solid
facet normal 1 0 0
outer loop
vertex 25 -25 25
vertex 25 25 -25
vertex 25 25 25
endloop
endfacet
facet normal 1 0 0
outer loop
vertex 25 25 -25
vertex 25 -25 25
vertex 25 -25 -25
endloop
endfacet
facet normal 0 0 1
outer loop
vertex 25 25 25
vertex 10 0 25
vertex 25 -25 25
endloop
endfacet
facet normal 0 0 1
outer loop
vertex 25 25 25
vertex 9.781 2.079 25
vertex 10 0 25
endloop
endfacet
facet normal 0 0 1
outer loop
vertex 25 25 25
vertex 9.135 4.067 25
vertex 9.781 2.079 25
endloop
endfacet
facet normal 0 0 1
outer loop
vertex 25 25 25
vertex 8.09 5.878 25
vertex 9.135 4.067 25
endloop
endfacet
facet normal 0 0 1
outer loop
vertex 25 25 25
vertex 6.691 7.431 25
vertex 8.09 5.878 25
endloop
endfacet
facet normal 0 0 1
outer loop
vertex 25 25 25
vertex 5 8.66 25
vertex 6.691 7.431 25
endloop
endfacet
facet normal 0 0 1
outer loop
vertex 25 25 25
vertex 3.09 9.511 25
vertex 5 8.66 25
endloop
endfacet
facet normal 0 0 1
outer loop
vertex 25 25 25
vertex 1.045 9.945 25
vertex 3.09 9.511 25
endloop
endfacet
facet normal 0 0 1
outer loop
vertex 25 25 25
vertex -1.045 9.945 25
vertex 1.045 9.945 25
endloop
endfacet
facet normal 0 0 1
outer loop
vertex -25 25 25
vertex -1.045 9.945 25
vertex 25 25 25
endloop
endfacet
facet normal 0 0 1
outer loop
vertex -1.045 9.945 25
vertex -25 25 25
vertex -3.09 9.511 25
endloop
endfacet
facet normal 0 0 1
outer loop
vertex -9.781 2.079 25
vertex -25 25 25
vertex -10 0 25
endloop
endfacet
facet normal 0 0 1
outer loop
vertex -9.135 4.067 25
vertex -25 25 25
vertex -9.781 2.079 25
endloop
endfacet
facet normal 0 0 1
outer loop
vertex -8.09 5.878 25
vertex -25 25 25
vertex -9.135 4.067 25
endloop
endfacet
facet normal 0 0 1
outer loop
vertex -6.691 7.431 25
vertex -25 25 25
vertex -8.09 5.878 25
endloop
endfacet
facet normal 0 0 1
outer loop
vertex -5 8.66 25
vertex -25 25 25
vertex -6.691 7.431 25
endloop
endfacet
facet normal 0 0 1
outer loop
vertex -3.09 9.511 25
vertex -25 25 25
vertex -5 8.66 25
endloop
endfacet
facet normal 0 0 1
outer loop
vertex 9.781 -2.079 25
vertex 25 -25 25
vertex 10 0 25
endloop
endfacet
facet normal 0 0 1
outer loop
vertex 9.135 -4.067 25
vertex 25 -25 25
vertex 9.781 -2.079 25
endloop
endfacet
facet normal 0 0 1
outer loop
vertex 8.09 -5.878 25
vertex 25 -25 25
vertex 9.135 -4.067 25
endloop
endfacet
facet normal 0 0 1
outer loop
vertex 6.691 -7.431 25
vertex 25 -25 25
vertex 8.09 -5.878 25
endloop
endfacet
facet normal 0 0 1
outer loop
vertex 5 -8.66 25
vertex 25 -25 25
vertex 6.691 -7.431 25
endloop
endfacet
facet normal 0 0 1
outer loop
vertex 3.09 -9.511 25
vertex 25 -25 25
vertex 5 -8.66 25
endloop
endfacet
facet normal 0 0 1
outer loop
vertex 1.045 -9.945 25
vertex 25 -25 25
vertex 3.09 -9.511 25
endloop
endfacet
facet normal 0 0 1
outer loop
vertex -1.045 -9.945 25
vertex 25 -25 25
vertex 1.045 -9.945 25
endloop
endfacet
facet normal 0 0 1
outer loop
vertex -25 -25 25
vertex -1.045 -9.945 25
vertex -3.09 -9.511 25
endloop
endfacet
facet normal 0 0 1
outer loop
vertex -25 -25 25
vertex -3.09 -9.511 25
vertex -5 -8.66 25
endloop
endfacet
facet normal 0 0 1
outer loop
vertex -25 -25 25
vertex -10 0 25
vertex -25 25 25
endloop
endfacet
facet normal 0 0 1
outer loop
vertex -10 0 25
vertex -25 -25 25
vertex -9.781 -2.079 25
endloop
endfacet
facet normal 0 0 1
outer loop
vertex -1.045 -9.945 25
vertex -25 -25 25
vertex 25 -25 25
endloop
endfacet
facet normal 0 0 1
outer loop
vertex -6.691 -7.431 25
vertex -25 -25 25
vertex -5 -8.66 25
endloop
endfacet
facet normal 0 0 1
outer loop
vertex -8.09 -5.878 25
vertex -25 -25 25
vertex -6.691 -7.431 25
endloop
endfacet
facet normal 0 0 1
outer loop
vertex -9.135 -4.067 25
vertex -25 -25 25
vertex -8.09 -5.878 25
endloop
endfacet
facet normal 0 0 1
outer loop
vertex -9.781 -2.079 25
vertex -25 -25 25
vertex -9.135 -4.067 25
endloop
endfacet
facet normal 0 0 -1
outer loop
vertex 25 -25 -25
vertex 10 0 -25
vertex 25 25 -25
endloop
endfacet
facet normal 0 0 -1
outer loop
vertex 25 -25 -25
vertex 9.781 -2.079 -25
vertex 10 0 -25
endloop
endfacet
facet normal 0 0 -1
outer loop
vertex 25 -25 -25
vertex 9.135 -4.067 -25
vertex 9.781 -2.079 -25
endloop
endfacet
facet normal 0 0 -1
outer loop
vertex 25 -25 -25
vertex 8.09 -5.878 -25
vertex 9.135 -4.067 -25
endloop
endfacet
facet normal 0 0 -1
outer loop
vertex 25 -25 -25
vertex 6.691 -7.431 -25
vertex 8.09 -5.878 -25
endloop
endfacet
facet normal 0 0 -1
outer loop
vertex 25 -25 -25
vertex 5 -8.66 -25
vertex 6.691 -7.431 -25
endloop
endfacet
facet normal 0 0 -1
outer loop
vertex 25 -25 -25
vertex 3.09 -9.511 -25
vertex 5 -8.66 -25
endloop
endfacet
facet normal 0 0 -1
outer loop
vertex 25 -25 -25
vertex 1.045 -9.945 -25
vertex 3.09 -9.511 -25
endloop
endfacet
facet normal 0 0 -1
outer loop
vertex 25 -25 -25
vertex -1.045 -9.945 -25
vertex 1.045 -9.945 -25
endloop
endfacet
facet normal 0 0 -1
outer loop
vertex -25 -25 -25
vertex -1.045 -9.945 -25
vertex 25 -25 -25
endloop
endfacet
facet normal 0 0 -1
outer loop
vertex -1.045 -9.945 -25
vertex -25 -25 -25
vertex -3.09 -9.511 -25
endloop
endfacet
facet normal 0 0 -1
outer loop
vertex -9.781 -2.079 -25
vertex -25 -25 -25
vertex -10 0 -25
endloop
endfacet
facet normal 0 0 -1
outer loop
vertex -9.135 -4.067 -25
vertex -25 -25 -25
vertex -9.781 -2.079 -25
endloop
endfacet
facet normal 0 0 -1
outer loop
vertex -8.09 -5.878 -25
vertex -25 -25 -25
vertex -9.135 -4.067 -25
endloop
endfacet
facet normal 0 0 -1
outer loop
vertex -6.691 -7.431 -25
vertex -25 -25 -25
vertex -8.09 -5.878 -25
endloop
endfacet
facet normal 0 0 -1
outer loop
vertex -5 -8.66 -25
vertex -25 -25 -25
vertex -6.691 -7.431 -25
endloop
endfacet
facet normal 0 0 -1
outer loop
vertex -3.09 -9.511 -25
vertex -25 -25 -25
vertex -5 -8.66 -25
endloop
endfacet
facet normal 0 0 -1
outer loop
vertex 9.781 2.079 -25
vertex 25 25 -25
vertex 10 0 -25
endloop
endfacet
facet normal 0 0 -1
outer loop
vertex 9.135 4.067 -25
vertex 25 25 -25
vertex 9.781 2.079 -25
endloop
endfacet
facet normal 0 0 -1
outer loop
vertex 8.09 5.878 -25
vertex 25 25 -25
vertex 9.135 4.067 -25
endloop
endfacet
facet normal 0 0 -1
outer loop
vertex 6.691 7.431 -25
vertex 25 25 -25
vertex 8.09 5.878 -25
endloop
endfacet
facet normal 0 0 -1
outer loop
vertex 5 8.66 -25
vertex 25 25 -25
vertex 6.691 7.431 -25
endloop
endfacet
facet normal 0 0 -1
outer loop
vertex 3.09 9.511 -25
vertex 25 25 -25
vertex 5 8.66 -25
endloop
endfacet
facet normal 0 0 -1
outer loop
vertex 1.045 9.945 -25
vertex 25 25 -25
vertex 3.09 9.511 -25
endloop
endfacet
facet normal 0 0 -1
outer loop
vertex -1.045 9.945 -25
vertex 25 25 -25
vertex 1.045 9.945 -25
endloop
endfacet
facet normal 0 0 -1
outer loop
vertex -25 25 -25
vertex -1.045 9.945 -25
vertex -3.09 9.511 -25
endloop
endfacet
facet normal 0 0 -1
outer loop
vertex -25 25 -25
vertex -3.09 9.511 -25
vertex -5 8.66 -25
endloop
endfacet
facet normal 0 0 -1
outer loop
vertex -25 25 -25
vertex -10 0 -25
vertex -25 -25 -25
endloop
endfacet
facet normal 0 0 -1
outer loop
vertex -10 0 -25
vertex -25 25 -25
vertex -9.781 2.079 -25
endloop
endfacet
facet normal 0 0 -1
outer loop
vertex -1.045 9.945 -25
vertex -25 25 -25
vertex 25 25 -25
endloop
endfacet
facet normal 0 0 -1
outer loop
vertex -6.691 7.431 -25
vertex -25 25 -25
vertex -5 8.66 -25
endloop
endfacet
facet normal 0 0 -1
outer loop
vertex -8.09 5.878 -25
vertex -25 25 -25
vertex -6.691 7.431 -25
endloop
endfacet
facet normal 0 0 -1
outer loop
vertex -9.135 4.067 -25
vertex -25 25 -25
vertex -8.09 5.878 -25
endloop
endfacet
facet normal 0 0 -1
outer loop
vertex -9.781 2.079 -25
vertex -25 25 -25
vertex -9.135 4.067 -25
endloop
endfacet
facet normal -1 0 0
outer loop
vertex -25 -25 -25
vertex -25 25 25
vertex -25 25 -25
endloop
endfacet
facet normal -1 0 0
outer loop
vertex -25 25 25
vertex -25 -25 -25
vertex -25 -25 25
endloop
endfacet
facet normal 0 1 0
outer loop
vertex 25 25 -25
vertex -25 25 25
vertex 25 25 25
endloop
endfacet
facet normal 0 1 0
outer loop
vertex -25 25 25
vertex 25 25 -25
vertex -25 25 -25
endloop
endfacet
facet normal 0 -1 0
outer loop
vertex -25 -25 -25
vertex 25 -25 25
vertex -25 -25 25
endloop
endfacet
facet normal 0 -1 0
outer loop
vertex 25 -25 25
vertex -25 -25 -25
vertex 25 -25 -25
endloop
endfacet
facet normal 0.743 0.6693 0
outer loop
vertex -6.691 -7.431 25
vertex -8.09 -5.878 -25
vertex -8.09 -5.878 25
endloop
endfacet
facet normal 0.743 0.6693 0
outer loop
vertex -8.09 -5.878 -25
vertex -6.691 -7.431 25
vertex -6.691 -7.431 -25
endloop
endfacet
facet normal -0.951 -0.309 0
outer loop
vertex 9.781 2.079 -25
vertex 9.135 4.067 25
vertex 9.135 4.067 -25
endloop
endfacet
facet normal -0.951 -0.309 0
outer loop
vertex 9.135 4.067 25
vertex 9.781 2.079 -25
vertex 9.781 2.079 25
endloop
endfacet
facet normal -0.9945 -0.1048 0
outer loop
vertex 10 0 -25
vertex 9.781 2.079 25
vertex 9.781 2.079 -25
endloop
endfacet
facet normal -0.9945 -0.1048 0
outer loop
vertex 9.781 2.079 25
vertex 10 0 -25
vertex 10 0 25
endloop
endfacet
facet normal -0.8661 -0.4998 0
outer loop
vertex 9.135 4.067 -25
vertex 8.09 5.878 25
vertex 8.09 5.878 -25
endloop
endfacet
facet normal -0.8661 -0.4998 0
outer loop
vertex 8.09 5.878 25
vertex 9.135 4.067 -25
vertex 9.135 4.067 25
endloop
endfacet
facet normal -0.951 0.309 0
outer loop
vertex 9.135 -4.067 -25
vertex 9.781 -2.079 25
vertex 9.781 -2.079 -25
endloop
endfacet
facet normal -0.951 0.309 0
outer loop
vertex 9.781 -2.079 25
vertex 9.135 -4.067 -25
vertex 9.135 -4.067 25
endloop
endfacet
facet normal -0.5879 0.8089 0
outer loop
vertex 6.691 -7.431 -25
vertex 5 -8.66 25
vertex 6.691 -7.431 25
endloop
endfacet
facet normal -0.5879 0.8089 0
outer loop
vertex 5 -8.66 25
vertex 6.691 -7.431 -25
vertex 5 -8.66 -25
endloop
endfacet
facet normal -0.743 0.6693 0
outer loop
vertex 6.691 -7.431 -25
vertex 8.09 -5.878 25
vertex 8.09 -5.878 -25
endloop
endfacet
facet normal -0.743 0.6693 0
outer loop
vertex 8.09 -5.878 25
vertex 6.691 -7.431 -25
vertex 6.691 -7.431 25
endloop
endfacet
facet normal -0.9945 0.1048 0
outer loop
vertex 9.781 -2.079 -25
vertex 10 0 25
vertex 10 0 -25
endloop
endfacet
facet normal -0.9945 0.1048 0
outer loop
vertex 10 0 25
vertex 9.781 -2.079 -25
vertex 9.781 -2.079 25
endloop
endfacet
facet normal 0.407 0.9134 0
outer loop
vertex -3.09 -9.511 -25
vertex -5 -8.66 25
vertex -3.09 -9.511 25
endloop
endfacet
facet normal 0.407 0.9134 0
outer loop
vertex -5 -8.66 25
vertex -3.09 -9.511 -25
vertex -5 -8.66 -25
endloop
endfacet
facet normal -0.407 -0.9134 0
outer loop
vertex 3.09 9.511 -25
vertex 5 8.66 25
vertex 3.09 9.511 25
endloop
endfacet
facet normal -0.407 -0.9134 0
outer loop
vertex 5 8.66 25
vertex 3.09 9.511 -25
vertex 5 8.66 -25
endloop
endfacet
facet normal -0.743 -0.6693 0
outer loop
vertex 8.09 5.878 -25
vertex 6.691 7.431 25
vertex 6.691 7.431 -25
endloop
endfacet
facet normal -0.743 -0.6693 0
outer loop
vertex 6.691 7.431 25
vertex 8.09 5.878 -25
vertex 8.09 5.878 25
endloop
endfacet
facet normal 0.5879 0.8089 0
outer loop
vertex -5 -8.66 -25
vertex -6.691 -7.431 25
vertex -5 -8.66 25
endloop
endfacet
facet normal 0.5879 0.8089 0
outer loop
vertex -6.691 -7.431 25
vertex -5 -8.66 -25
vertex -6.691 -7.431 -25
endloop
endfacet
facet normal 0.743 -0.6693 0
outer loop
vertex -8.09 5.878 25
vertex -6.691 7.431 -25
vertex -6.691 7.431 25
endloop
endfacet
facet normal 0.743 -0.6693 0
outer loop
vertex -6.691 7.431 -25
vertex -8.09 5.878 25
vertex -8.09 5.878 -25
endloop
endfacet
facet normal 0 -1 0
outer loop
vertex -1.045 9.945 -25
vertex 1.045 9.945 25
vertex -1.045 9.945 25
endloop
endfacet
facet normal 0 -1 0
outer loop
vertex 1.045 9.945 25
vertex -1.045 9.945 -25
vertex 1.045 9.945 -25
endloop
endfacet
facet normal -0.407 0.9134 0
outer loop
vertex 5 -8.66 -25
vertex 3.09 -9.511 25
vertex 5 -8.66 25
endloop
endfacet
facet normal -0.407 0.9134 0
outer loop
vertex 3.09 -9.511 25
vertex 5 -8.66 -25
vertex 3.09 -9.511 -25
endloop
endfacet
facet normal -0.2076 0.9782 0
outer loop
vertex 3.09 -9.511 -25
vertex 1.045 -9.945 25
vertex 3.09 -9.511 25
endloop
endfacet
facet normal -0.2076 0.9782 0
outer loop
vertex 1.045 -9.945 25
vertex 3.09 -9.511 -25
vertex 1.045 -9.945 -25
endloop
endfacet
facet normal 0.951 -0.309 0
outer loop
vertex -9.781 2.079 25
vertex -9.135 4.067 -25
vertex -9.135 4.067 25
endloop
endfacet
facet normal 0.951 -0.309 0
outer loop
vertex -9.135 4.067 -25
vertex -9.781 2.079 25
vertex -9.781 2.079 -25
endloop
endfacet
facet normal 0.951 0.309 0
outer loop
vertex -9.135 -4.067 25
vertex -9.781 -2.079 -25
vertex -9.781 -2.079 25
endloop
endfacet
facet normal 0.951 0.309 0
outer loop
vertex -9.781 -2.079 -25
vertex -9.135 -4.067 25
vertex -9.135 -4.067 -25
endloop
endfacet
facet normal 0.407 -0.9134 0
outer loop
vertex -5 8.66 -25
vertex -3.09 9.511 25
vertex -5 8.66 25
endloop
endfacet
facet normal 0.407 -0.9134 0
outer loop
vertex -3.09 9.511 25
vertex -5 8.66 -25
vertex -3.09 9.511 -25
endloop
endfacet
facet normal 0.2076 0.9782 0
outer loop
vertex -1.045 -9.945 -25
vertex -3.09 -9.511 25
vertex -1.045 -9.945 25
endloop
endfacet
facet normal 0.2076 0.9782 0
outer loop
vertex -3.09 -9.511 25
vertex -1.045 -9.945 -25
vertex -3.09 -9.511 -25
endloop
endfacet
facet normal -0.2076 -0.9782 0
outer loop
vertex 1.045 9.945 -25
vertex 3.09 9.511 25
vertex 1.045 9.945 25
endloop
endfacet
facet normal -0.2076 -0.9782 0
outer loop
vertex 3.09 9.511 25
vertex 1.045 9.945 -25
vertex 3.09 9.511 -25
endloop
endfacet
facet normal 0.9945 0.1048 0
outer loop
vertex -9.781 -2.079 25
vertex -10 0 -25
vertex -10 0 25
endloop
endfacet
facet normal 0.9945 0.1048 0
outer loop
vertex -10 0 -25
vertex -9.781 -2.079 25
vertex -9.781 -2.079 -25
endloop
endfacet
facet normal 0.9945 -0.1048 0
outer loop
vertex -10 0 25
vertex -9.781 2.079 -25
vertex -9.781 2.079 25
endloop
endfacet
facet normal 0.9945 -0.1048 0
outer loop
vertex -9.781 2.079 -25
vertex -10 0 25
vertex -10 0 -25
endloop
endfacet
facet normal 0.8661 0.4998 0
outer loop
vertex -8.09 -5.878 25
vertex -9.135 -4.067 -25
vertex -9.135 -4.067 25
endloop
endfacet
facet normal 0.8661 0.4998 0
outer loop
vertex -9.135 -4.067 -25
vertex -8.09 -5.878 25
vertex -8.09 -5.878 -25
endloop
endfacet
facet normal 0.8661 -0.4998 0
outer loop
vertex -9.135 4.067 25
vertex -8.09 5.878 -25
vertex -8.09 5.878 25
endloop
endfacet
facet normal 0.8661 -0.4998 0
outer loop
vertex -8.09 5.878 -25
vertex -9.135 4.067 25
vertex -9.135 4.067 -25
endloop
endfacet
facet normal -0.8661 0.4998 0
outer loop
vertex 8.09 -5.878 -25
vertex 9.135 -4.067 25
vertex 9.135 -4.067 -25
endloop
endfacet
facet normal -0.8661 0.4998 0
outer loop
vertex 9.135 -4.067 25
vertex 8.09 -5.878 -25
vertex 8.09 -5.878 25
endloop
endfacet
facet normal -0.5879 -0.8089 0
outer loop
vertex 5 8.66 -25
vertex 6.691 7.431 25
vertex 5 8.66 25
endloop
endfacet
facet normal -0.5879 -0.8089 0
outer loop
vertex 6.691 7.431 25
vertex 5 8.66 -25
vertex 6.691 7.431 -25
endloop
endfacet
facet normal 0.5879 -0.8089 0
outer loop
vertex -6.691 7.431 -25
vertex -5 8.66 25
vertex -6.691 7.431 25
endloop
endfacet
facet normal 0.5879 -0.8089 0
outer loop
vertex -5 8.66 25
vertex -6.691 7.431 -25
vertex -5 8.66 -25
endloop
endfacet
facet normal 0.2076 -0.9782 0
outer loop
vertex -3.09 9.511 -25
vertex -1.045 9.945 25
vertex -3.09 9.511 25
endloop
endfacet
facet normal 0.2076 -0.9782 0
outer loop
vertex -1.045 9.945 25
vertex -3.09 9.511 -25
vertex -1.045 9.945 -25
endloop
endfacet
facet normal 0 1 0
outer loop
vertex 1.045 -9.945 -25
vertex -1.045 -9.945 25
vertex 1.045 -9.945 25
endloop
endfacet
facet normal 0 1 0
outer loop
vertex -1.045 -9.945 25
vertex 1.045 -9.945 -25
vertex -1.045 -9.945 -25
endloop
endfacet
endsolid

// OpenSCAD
cube_size = 50;
hole_diameter = 20;
hole_height = 60;

color("red")
difference() {
    cube([cube_size, cube_size, cube_size], center = true);
    
    cylinder(h = hole_height, d = hole_diameter, center = true);
}
